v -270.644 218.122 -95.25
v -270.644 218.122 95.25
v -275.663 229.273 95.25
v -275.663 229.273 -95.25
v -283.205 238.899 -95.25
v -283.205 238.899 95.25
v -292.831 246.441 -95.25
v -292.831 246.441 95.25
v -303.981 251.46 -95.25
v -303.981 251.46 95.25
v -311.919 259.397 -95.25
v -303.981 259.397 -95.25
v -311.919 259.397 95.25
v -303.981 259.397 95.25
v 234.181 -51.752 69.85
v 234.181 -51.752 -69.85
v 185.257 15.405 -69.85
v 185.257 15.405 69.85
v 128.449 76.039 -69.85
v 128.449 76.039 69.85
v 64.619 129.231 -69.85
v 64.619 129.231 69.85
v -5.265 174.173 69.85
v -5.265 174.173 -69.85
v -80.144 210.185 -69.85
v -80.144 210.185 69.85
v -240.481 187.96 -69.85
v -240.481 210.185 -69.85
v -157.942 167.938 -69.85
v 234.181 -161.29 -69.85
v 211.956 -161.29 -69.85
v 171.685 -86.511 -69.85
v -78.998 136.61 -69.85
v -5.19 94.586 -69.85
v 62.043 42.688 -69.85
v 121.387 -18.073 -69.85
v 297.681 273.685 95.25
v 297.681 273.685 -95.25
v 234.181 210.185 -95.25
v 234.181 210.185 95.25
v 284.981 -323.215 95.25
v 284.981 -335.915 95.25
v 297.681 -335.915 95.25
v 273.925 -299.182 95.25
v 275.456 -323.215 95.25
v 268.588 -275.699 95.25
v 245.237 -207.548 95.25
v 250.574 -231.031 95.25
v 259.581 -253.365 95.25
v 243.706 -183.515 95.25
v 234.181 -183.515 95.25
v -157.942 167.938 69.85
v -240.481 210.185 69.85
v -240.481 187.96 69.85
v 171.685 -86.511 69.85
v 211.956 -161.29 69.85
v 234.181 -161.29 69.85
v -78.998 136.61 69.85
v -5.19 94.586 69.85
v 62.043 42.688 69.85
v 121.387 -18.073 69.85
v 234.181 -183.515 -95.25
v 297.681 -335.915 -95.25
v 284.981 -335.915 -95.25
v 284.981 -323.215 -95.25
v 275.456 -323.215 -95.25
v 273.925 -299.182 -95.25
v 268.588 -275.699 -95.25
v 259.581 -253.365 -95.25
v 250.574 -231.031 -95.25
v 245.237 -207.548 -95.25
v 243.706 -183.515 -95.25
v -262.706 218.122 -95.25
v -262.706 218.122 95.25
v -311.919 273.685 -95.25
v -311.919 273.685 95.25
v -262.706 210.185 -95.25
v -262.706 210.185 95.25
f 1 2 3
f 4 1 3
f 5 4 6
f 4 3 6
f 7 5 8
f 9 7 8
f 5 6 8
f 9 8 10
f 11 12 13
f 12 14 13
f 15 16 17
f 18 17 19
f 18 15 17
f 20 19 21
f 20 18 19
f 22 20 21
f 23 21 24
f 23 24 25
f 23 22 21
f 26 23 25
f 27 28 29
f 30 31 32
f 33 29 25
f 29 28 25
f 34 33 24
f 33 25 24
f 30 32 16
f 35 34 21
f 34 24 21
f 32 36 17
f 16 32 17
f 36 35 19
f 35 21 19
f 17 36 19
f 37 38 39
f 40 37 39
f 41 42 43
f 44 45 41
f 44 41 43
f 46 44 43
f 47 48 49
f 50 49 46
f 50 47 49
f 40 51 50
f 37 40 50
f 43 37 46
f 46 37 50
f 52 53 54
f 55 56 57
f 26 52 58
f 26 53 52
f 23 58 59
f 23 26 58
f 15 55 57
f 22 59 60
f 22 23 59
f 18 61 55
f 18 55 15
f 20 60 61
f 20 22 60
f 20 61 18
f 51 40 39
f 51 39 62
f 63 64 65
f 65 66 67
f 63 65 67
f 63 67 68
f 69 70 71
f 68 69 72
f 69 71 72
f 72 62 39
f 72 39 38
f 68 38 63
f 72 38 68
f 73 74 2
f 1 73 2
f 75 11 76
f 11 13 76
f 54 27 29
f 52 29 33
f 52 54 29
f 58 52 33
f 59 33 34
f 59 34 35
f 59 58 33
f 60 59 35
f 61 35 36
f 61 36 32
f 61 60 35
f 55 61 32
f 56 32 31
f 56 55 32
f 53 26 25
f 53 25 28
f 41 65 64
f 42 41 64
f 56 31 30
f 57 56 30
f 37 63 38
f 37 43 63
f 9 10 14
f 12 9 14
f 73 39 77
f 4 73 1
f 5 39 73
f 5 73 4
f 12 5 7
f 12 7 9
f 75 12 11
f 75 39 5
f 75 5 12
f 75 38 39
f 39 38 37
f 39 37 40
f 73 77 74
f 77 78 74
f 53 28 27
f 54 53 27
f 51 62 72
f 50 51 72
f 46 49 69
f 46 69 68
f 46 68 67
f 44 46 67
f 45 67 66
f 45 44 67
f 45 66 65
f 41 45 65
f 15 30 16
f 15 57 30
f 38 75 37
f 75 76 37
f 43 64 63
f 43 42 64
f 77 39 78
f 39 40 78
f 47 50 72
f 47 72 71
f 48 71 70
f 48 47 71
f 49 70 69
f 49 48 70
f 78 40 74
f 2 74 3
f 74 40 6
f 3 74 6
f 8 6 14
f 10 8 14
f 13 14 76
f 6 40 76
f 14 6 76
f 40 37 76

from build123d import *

# Parameters (mm, degrees)
BOSS_EXTRUDE1_DEPTH = 95.25
BOSS_EXTRUDE2_DEPTH = 69.85
BOSS_EXTRUDE3_DEPTH = 95.25


with BuildPart() as part:
    # Sketch1 → Boss-Extrude1 (new body, symmetric)
    with BuildSketch(Plane.XY):
        with BuildLine():
            Line((-303.981276984, 251.46), (-303.981276984, 259.3975))
            Line((-303.981276984, 259.3975), (-311.918776984, 259.3975))
            Line((-311.918776984, 259.3975), (-311.918776984, 273.685))
            Line((-311.918776984, 273.685), (297.681223016, 273.685))
            Line((297.681223016, 273.685), (234.181223016, 210.185))
            Line((234.181223016, 210.185), (-262.706276984, 210.185))
            Line((-262.706276984, 210.185), (-262.706276984, 218.1225))
            Line((-262.706276984, 218.1225), (-270.643776984, 218.1225))
            ThreePointArc((-270.643776984, 218.1225), (-283.204800802, 238.898976183), (-303.981276984, 251.46))
        make_face()
    extrude(amount=BOSS_EXTRUDE1_DEPTH, both=True)


with BuildPart() as body_2:
    # Sketch1_3 → Boss-Extrude2 (new body, symmetric)
    with BuildSketch(Plane.XY):
        with BuildLine():
            ThreePointArc((234.181223016, -51.7525), (97.353674253, 103.618191485), (-80.143776984, 210.185))
            Line((-80.143776984, 210.185), (-240.481276984, 210.185))
            Line((-240.481276984, 210.185), (-240.481276984, 187.96))
            ThreePointArc((-240.481276984, 187.96), (29.333912258, 69.812205382), (211.956223016, -161.29))
            Line((211.956223016, -161.29), (234.181223016, -161.29))
            Line((234.181223016, -161.29), (234.181223016, -51.7525))
        make_face()
    extrude(amount=BOSS_EXTRUDE2_DEPTH, both=True)


with BuildPart() as body_3:
    # Sketch1_4 → Boss-Extrude3 (new body, symmetric)
    with BuildSketch(Plane.XY):
        with BuildLine():
            Line((297.681223016, -335.915), (297.681223016, 273.685))
            Line((297.681223016, 273.685), (234.181223016, 210.185))
            Line((234.181223016, 210.185), (234.181223016, -183.515))
            Line((234.181223016, -183.515), (243.706223016, -183.515))
            ThreePointArc((243.706223016, -183.515), (247.436467782, -219.396194371), (259.581223016, -253.365))
            ThreePointArc((259.581223016, -253.365), (271.725978249, -287.333805629), (275.456223016, -323.215))
            Line((275.456223016, -323.215), (284.981223016, -323.215))
            Line((284.981223016, -323.215), (284.981223016, -335.915))
            Line((284.981223016, -335.915), (297.681223016, -335.915))
        make_face()
    extrude(amount=BOSS_EXTRUDE3_DEPTH, both=True)


solid = Compound([part.part, body_2.part, body_3.part])
